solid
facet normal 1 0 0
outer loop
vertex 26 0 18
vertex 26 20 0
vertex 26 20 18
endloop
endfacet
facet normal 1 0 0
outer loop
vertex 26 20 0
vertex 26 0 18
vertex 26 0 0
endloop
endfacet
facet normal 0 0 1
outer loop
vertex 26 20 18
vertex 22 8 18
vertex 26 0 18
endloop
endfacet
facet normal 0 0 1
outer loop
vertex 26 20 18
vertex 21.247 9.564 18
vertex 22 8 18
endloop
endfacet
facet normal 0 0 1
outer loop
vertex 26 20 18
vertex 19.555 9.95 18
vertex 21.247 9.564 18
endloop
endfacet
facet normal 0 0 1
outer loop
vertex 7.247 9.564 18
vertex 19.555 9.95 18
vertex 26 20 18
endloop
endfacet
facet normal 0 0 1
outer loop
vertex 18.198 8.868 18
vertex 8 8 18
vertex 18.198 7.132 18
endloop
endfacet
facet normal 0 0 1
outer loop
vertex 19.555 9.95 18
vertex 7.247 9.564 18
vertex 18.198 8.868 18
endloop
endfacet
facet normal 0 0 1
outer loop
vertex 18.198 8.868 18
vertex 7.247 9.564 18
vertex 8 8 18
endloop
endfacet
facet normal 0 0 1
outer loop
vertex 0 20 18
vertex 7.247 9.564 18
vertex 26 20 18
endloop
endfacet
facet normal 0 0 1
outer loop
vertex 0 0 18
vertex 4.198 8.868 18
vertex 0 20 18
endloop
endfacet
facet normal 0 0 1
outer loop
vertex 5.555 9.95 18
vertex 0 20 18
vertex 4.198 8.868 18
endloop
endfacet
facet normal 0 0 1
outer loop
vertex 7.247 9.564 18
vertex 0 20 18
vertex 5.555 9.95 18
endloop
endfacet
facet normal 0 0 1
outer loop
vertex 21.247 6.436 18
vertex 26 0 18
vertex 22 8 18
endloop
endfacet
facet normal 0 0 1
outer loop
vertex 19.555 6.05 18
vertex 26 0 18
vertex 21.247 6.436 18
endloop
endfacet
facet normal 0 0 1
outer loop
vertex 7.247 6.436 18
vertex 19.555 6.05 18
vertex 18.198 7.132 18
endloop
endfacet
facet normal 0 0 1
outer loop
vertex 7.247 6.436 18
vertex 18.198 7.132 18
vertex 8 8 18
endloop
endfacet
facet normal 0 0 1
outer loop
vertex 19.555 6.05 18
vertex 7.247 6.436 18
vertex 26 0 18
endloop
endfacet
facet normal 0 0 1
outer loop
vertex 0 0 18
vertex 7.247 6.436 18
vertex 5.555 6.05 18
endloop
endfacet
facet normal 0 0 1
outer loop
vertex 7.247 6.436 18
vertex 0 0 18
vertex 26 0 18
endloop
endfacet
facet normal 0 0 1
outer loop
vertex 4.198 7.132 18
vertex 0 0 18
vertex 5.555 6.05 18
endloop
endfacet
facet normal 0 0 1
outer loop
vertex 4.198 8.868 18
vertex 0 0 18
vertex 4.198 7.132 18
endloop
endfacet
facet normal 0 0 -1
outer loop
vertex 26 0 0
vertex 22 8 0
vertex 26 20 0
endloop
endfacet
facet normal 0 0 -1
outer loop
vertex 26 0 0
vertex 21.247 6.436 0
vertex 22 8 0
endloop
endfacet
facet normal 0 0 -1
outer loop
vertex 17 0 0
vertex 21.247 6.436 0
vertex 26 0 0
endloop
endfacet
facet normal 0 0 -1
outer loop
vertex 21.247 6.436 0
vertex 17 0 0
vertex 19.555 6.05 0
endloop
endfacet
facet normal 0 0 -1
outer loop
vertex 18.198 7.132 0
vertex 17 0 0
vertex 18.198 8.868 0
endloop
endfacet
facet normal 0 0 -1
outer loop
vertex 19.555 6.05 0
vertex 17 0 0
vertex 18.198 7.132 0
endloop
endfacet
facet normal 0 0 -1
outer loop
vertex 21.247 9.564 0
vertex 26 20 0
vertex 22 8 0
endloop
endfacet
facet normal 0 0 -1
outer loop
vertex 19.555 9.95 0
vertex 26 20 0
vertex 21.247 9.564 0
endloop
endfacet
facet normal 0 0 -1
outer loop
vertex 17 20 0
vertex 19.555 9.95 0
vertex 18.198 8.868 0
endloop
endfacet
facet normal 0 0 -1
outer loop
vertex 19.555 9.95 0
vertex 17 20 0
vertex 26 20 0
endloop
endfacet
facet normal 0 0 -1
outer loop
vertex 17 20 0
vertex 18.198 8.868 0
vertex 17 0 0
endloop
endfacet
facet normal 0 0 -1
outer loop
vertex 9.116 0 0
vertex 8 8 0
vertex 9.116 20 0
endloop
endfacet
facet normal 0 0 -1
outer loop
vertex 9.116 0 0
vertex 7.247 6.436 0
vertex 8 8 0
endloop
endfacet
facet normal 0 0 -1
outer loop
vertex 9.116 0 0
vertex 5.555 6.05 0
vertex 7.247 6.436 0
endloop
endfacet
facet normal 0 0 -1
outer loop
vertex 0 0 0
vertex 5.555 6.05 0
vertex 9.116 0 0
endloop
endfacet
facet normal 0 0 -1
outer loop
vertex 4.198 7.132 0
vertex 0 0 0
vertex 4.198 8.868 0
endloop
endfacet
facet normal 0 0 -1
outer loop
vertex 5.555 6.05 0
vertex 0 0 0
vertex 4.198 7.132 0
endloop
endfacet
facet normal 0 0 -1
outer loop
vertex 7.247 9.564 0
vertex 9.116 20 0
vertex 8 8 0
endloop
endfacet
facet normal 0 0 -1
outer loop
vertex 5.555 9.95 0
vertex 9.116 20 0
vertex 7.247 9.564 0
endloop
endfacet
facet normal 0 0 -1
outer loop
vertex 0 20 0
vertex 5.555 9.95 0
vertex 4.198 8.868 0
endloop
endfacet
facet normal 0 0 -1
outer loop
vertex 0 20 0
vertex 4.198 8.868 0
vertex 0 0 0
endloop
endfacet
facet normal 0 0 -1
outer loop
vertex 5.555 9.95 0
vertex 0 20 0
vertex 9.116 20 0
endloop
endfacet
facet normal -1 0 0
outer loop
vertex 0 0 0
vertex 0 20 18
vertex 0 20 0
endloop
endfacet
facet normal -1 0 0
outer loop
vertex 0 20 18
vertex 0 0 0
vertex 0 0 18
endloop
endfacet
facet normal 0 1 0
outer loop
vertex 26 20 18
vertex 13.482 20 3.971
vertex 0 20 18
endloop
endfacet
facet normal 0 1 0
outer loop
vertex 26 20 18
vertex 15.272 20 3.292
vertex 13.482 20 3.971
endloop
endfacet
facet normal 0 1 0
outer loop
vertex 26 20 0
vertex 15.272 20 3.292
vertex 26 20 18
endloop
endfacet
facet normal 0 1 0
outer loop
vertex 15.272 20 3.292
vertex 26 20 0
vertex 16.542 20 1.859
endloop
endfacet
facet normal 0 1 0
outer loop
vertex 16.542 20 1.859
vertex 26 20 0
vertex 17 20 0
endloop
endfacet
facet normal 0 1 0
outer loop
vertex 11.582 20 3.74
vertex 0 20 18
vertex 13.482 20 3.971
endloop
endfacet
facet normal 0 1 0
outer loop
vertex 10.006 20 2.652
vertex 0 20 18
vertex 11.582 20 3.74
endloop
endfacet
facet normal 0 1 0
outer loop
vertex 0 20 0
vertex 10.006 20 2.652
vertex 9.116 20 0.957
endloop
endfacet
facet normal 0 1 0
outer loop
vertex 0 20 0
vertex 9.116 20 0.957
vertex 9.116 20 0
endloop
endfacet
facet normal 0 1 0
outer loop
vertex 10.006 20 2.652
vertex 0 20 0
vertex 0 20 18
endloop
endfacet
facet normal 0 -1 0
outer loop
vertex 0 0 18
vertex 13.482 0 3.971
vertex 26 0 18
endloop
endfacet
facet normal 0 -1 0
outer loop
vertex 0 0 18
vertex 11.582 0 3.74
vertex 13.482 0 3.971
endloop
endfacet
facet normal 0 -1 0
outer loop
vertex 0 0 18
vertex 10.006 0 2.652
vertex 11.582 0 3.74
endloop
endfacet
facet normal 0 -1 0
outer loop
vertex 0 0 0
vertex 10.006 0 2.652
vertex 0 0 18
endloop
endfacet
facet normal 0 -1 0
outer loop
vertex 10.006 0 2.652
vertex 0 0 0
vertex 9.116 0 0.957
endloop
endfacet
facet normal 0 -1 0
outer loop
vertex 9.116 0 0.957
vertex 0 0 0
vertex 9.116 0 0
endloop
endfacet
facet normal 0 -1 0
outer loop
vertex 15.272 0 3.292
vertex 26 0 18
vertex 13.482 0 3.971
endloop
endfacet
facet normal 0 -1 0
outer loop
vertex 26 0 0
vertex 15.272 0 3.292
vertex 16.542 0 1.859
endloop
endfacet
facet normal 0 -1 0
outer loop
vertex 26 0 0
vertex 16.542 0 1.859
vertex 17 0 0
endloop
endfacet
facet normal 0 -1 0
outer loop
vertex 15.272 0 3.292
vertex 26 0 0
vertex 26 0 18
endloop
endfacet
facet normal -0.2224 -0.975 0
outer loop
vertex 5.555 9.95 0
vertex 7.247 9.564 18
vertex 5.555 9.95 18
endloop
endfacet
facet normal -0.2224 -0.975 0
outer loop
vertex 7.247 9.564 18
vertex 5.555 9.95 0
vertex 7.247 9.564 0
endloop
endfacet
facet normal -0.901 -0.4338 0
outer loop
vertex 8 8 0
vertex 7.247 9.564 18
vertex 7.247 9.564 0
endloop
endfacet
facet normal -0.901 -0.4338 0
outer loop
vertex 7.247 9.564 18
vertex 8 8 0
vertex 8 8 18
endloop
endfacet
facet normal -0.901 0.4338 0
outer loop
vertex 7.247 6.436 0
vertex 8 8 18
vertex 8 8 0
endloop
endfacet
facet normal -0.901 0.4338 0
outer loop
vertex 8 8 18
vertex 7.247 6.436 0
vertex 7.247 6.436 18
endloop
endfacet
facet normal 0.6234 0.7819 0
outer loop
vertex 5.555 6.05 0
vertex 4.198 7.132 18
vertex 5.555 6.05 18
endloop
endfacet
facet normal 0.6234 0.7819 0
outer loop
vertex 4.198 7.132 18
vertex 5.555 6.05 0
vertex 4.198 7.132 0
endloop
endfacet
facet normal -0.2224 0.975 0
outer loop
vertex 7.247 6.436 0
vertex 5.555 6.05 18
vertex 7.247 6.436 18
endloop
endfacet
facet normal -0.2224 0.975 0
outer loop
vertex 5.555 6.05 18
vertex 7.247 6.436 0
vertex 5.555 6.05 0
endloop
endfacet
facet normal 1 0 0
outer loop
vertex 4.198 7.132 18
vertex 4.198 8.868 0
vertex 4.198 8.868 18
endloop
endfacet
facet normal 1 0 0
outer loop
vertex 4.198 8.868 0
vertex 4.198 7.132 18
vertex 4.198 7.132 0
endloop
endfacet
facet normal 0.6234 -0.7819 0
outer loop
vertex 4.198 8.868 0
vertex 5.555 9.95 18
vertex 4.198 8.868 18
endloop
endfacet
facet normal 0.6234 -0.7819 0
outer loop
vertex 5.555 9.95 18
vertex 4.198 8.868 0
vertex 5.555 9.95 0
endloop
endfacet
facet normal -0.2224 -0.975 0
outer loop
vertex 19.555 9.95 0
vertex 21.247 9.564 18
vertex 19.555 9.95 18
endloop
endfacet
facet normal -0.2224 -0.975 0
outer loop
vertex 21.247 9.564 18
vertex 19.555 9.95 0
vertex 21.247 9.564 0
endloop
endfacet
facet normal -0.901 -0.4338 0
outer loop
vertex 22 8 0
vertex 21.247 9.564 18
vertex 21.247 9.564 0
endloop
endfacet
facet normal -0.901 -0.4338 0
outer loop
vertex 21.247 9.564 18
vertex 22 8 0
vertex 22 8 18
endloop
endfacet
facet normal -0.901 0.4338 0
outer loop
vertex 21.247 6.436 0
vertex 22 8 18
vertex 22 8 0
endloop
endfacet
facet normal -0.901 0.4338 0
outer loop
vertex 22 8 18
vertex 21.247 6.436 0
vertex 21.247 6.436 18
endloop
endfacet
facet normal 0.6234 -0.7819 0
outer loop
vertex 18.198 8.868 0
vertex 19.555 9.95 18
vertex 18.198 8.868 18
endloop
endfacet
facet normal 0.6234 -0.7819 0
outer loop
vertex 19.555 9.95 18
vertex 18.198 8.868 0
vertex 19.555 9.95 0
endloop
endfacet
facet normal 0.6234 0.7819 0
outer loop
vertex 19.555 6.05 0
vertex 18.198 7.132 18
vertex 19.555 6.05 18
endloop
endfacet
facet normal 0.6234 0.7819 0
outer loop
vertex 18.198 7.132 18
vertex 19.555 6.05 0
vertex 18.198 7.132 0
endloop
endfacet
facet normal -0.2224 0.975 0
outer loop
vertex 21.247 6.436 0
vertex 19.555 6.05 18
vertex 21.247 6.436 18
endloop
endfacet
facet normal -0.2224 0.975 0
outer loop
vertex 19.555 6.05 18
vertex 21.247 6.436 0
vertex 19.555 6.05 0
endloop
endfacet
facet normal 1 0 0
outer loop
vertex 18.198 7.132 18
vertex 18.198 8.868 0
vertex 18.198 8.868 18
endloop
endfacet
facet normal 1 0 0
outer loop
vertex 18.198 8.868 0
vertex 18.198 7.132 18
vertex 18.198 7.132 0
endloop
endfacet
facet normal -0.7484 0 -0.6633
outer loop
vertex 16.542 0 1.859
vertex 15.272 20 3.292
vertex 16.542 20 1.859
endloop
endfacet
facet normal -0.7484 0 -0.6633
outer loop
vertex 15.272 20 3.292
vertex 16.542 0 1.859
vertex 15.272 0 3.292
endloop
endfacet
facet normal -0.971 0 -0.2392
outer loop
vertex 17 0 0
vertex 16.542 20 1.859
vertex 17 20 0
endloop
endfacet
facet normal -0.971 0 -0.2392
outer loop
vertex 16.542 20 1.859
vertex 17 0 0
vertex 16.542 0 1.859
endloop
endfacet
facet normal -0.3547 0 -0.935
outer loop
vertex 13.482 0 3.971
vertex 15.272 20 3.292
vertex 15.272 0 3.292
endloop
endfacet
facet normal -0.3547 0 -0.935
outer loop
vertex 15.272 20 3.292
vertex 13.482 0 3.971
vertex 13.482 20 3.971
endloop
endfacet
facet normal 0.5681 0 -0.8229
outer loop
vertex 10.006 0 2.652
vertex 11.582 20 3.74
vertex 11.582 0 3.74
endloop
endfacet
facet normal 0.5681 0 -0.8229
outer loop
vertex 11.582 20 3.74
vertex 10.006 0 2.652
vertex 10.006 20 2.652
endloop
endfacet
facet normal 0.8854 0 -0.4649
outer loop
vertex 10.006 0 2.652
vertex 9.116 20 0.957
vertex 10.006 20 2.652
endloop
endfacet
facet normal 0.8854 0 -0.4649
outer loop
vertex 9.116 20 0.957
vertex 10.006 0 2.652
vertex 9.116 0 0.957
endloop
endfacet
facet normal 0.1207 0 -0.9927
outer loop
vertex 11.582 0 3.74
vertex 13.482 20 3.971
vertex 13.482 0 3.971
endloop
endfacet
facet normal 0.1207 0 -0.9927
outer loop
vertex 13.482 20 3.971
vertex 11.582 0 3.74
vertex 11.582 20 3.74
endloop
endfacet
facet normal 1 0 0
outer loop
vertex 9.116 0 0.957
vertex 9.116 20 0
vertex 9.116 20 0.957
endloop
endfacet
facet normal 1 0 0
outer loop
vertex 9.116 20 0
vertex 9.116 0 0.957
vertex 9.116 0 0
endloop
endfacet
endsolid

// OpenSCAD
// 
/*
 *  Z Leadscrew Base Bar Clamp
 *  by Timothy Schmidt.
 *
 *  This program is free software; you can redistribute it and/or modify
 *  it under the terms of the GNU General Public License as published by
 *  the Free Software Foundation; either version 2 of the License, or
 *  (at your option) any later version.
 *
 *  This program is distributed in the hope that it will be useful,
 *  but WITHOUT ANY WARRANTY; without even the implied warranty of
 *  MERCHANTABILITY or FITNESS FOR A PARTICULAR PURPOSE.  See the
 *  GNU General Public License for more details.
 *
 *  You should have received a copy of the GNU General Public License
 *  along with this program; if not, write to the Free Software
 *  Foundation, Inc., 59 Temple Place, Suite 330, Boston, MA  02111-1307  USA
 *
*/

difference () {
	cube(size=[26,20,18]);
	translate(v=[6,8,-1]) cylinder(r=2,h=20);
	translate(v=[20,8,-1]) cylinder(r=2,h=20);
	rotate([90,0,0]) translate(v=[13,0,-21]) cylinder(r=4,h=22);
}
